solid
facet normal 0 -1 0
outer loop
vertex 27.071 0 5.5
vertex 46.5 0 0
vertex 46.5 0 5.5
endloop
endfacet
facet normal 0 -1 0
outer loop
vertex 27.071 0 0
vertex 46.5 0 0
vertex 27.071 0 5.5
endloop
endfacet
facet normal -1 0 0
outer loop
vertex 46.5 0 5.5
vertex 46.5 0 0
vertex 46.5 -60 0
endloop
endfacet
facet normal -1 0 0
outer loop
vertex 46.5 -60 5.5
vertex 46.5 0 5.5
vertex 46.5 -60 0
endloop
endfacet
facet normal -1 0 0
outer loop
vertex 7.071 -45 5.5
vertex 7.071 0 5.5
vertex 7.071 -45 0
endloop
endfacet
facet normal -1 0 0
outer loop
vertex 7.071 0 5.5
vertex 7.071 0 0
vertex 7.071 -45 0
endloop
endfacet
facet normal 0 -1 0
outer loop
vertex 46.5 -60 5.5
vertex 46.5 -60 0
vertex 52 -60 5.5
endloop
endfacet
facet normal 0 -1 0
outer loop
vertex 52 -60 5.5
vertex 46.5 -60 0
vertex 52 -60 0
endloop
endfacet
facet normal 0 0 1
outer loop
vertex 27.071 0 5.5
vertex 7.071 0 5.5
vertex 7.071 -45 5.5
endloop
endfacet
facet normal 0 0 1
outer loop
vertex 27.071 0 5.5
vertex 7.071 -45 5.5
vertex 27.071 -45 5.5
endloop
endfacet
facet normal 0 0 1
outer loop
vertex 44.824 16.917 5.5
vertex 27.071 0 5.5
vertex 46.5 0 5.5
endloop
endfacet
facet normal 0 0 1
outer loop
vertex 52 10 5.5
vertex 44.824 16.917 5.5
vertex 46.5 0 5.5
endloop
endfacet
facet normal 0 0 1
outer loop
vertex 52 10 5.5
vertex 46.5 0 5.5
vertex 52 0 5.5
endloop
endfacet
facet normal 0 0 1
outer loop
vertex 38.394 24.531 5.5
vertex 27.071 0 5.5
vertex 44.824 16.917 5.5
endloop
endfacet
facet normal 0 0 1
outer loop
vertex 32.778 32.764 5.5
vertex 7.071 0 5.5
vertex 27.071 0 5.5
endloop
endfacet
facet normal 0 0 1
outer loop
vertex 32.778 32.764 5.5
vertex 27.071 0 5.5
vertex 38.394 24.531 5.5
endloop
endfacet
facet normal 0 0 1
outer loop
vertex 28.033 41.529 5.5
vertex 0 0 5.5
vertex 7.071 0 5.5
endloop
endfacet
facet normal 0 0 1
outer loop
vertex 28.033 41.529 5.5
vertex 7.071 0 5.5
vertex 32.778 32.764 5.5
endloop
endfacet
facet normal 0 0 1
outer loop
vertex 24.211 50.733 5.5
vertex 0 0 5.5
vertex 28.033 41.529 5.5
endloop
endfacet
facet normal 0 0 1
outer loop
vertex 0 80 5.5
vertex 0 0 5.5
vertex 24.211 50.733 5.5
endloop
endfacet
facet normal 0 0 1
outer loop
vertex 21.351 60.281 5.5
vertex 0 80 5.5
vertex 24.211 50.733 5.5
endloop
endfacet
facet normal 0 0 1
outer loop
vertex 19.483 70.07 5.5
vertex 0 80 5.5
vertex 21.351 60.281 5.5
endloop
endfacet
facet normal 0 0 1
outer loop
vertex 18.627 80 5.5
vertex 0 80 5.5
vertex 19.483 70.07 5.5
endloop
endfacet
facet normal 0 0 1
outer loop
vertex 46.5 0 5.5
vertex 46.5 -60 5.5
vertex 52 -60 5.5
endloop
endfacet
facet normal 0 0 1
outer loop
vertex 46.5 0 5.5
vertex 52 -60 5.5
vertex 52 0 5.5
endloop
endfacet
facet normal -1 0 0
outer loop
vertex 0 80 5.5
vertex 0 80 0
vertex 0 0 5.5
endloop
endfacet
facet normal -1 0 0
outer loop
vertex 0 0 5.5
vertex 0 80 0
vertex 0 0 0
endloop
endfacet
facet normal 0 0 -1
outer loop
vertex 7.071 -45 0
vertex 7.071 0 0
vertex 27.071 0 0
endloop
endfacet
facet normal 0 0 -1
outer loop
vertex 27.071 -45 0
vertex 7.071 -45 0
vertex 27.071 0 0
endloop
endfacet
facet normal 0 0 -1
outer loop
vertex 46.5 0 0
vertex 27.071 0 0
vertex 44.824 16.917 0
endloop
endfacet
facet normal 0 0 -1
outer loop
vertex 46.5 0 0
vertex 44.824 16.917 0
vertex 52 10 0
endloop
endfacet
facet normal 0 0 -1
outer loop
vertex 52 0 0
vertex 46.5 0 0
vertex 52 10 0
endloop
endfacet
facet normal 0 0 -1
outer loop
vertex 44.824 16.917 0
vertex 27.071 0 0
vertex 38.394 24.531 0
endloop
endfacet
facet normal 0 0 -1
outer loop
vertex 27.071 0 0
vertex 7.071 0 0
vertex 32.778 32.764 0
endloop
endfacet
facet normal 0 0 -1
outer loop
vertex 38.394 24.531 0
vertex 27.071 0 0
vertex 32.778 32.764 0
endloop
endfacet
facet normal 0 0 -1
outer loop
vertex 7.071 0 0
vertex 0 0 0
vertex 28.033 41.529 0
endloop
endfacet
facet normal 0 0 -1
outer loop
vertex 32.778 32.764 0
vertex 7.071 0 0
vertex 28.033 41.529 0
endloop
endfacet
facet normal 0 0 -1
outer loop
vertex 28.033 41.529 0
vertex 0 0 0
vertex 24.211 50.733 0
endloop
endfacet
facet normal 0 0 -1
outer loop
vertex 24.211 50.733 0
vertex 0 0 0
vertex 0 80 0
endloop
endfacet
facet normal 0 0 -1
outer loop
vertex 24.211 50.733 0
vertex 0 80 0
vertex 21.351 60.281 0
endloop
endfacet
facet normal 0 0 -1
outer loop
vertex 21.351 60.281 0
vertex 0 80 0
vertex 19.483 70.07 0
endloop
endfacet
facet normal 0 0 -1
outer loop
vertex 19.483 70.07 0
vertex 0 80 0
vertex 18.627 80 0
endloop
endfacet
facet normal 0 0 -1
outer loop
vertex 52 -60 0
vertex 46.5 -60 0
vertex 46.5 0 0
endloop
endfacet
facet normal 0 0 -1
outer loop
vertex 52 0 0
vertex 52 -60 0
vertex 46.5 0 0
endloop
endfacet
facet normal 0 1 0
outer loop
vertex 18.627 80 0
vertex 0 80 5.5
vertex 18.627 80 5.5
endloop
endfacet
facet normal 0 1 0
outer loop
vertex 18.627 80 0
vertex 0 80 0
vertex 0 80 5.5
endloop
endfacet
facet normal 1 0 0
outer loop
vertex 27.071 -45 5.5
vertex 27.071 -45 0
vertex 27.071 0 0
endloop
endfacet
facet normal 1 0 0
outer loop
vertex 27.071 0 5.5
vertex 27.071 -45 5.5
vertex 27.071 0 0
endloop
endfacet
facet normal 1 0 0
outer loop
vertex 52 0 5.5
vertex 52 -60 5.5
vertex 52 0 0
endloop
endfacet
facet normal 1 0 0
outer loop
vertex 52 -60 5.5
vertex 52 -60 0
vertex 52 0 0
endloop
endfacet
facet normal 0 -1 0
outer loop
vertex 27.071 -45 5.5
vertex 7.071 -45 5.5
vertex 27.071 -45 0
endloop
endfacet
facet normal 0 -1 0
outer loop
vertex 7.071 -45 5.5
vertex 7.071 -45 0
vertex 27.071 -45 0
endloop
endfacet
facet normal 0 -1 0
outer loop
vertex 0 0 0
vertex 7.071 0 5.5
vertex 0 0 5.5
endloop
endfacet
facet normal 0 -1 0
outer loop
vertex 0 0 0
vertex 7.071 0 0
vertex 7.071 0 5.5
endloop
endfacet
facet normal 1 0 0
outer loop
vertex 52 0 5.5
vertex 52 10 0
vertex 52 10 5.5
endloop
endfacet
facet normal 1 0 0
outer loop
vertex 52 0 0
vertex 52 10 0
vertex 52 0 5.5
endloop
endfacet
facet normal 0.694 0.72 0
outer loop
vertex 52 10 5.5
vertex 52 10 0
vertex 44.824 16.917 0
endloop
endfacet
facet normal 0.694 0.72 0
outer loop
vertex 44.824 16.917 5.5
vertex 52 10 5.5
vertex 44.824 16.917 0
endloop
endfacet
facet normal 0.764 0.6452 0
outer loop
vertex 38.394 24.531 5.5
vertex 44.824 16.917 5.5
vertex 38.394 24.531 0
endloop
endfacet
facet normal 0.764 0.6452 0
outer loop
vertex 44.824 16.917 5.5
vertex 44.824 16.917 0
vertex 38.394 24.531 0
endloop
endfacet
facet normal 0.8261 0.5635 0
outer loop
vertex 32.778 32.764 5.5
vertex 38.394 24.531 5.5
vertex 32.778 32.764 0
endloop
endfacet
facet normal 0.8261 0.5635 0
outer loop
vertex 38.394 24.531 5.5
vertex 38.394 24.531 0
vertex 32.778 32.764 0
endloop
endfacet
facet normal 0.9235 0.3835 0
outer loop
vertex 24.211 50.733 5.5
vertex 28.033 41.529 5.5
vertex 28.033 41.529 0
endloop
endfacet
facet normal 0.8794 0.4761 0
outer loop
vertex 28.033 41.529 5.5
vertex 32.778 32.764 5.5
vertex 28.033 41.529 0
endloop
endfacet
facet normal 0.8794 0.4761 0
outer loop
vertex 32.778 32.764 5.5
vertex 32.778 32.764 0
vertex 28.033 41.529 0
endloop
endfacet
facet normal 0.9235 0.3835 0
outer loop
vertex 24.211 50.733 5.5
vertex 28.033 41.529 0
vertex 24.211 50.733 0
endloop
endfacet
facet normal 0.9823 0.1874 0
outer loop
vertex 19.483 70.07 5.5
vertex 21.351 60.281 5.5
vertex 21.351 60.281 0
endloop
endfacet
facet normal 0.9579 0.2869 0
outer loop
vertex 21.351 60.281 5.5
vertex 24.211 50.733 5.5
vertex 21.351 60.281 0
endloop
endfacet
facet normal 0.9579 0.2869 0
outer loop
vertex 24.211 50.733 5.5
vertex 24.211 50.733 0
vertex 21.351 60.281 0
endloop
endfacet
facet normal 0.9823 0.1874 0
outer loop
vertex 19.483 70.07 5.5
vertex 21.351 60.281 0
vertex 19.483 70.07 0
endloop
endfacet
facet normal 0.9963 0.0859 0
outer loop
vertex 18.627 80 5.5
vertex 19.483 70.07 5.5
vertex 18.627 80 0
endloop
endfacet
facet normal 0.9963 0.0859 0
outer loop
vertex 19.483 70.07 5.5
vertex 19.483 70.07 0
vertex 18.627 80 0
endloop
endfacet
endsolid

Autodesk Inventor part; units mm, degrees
ref_plane "YZ Plane" through (0, 0, 0) normal (1, 0, 0) x (0, 1, 0)
ref_plane "XZ Plane" through (0, 0, 0) normal (0, 1, 0) x (-1, 0, 0)
ref_plane "XY Plane" through (0, 0, 0) normal (0, 0, 1) x (1, 0, 0)
sketch "Sketch1" plane through (0, 0, 0) normal (0, 0, 1) x (1, 0, 0)
  arc A0 (18.6268, 80) -> (52, 10) centre (115.8042, 83.3748) ccw
  line L0 (0, 80) -> (18.6268, 80)
  line L1 (46.5, 0) -> (27.071, 0)
  line L2 (7.071, 0) -> (0, 0)
  line L3 (7.071, 0) -> (7.071, -45)
  line L4 (7.071, -45) -> (27.071, -45)
  line L5 (27.071, -45) -> (27.071, 0)
  line L6 (46.5, 0) -> (46.5, -60)
  line L7 (46.5, -60) -> (52, -60)
  line L8 (52, -60) -> (52, 0)
  line L9 (0, 80) -> (0, 0)
  line L10 (52, 10) -> (52, 0)
  dimension "d22" = 52
  dimension "d23" = 19.429
  dimension "d24" = 45
  dimension "d25" = 60
extrude "Extrusion2" add sketch "Sketch1" along normal blind 5.5
properties part number "brazos"
